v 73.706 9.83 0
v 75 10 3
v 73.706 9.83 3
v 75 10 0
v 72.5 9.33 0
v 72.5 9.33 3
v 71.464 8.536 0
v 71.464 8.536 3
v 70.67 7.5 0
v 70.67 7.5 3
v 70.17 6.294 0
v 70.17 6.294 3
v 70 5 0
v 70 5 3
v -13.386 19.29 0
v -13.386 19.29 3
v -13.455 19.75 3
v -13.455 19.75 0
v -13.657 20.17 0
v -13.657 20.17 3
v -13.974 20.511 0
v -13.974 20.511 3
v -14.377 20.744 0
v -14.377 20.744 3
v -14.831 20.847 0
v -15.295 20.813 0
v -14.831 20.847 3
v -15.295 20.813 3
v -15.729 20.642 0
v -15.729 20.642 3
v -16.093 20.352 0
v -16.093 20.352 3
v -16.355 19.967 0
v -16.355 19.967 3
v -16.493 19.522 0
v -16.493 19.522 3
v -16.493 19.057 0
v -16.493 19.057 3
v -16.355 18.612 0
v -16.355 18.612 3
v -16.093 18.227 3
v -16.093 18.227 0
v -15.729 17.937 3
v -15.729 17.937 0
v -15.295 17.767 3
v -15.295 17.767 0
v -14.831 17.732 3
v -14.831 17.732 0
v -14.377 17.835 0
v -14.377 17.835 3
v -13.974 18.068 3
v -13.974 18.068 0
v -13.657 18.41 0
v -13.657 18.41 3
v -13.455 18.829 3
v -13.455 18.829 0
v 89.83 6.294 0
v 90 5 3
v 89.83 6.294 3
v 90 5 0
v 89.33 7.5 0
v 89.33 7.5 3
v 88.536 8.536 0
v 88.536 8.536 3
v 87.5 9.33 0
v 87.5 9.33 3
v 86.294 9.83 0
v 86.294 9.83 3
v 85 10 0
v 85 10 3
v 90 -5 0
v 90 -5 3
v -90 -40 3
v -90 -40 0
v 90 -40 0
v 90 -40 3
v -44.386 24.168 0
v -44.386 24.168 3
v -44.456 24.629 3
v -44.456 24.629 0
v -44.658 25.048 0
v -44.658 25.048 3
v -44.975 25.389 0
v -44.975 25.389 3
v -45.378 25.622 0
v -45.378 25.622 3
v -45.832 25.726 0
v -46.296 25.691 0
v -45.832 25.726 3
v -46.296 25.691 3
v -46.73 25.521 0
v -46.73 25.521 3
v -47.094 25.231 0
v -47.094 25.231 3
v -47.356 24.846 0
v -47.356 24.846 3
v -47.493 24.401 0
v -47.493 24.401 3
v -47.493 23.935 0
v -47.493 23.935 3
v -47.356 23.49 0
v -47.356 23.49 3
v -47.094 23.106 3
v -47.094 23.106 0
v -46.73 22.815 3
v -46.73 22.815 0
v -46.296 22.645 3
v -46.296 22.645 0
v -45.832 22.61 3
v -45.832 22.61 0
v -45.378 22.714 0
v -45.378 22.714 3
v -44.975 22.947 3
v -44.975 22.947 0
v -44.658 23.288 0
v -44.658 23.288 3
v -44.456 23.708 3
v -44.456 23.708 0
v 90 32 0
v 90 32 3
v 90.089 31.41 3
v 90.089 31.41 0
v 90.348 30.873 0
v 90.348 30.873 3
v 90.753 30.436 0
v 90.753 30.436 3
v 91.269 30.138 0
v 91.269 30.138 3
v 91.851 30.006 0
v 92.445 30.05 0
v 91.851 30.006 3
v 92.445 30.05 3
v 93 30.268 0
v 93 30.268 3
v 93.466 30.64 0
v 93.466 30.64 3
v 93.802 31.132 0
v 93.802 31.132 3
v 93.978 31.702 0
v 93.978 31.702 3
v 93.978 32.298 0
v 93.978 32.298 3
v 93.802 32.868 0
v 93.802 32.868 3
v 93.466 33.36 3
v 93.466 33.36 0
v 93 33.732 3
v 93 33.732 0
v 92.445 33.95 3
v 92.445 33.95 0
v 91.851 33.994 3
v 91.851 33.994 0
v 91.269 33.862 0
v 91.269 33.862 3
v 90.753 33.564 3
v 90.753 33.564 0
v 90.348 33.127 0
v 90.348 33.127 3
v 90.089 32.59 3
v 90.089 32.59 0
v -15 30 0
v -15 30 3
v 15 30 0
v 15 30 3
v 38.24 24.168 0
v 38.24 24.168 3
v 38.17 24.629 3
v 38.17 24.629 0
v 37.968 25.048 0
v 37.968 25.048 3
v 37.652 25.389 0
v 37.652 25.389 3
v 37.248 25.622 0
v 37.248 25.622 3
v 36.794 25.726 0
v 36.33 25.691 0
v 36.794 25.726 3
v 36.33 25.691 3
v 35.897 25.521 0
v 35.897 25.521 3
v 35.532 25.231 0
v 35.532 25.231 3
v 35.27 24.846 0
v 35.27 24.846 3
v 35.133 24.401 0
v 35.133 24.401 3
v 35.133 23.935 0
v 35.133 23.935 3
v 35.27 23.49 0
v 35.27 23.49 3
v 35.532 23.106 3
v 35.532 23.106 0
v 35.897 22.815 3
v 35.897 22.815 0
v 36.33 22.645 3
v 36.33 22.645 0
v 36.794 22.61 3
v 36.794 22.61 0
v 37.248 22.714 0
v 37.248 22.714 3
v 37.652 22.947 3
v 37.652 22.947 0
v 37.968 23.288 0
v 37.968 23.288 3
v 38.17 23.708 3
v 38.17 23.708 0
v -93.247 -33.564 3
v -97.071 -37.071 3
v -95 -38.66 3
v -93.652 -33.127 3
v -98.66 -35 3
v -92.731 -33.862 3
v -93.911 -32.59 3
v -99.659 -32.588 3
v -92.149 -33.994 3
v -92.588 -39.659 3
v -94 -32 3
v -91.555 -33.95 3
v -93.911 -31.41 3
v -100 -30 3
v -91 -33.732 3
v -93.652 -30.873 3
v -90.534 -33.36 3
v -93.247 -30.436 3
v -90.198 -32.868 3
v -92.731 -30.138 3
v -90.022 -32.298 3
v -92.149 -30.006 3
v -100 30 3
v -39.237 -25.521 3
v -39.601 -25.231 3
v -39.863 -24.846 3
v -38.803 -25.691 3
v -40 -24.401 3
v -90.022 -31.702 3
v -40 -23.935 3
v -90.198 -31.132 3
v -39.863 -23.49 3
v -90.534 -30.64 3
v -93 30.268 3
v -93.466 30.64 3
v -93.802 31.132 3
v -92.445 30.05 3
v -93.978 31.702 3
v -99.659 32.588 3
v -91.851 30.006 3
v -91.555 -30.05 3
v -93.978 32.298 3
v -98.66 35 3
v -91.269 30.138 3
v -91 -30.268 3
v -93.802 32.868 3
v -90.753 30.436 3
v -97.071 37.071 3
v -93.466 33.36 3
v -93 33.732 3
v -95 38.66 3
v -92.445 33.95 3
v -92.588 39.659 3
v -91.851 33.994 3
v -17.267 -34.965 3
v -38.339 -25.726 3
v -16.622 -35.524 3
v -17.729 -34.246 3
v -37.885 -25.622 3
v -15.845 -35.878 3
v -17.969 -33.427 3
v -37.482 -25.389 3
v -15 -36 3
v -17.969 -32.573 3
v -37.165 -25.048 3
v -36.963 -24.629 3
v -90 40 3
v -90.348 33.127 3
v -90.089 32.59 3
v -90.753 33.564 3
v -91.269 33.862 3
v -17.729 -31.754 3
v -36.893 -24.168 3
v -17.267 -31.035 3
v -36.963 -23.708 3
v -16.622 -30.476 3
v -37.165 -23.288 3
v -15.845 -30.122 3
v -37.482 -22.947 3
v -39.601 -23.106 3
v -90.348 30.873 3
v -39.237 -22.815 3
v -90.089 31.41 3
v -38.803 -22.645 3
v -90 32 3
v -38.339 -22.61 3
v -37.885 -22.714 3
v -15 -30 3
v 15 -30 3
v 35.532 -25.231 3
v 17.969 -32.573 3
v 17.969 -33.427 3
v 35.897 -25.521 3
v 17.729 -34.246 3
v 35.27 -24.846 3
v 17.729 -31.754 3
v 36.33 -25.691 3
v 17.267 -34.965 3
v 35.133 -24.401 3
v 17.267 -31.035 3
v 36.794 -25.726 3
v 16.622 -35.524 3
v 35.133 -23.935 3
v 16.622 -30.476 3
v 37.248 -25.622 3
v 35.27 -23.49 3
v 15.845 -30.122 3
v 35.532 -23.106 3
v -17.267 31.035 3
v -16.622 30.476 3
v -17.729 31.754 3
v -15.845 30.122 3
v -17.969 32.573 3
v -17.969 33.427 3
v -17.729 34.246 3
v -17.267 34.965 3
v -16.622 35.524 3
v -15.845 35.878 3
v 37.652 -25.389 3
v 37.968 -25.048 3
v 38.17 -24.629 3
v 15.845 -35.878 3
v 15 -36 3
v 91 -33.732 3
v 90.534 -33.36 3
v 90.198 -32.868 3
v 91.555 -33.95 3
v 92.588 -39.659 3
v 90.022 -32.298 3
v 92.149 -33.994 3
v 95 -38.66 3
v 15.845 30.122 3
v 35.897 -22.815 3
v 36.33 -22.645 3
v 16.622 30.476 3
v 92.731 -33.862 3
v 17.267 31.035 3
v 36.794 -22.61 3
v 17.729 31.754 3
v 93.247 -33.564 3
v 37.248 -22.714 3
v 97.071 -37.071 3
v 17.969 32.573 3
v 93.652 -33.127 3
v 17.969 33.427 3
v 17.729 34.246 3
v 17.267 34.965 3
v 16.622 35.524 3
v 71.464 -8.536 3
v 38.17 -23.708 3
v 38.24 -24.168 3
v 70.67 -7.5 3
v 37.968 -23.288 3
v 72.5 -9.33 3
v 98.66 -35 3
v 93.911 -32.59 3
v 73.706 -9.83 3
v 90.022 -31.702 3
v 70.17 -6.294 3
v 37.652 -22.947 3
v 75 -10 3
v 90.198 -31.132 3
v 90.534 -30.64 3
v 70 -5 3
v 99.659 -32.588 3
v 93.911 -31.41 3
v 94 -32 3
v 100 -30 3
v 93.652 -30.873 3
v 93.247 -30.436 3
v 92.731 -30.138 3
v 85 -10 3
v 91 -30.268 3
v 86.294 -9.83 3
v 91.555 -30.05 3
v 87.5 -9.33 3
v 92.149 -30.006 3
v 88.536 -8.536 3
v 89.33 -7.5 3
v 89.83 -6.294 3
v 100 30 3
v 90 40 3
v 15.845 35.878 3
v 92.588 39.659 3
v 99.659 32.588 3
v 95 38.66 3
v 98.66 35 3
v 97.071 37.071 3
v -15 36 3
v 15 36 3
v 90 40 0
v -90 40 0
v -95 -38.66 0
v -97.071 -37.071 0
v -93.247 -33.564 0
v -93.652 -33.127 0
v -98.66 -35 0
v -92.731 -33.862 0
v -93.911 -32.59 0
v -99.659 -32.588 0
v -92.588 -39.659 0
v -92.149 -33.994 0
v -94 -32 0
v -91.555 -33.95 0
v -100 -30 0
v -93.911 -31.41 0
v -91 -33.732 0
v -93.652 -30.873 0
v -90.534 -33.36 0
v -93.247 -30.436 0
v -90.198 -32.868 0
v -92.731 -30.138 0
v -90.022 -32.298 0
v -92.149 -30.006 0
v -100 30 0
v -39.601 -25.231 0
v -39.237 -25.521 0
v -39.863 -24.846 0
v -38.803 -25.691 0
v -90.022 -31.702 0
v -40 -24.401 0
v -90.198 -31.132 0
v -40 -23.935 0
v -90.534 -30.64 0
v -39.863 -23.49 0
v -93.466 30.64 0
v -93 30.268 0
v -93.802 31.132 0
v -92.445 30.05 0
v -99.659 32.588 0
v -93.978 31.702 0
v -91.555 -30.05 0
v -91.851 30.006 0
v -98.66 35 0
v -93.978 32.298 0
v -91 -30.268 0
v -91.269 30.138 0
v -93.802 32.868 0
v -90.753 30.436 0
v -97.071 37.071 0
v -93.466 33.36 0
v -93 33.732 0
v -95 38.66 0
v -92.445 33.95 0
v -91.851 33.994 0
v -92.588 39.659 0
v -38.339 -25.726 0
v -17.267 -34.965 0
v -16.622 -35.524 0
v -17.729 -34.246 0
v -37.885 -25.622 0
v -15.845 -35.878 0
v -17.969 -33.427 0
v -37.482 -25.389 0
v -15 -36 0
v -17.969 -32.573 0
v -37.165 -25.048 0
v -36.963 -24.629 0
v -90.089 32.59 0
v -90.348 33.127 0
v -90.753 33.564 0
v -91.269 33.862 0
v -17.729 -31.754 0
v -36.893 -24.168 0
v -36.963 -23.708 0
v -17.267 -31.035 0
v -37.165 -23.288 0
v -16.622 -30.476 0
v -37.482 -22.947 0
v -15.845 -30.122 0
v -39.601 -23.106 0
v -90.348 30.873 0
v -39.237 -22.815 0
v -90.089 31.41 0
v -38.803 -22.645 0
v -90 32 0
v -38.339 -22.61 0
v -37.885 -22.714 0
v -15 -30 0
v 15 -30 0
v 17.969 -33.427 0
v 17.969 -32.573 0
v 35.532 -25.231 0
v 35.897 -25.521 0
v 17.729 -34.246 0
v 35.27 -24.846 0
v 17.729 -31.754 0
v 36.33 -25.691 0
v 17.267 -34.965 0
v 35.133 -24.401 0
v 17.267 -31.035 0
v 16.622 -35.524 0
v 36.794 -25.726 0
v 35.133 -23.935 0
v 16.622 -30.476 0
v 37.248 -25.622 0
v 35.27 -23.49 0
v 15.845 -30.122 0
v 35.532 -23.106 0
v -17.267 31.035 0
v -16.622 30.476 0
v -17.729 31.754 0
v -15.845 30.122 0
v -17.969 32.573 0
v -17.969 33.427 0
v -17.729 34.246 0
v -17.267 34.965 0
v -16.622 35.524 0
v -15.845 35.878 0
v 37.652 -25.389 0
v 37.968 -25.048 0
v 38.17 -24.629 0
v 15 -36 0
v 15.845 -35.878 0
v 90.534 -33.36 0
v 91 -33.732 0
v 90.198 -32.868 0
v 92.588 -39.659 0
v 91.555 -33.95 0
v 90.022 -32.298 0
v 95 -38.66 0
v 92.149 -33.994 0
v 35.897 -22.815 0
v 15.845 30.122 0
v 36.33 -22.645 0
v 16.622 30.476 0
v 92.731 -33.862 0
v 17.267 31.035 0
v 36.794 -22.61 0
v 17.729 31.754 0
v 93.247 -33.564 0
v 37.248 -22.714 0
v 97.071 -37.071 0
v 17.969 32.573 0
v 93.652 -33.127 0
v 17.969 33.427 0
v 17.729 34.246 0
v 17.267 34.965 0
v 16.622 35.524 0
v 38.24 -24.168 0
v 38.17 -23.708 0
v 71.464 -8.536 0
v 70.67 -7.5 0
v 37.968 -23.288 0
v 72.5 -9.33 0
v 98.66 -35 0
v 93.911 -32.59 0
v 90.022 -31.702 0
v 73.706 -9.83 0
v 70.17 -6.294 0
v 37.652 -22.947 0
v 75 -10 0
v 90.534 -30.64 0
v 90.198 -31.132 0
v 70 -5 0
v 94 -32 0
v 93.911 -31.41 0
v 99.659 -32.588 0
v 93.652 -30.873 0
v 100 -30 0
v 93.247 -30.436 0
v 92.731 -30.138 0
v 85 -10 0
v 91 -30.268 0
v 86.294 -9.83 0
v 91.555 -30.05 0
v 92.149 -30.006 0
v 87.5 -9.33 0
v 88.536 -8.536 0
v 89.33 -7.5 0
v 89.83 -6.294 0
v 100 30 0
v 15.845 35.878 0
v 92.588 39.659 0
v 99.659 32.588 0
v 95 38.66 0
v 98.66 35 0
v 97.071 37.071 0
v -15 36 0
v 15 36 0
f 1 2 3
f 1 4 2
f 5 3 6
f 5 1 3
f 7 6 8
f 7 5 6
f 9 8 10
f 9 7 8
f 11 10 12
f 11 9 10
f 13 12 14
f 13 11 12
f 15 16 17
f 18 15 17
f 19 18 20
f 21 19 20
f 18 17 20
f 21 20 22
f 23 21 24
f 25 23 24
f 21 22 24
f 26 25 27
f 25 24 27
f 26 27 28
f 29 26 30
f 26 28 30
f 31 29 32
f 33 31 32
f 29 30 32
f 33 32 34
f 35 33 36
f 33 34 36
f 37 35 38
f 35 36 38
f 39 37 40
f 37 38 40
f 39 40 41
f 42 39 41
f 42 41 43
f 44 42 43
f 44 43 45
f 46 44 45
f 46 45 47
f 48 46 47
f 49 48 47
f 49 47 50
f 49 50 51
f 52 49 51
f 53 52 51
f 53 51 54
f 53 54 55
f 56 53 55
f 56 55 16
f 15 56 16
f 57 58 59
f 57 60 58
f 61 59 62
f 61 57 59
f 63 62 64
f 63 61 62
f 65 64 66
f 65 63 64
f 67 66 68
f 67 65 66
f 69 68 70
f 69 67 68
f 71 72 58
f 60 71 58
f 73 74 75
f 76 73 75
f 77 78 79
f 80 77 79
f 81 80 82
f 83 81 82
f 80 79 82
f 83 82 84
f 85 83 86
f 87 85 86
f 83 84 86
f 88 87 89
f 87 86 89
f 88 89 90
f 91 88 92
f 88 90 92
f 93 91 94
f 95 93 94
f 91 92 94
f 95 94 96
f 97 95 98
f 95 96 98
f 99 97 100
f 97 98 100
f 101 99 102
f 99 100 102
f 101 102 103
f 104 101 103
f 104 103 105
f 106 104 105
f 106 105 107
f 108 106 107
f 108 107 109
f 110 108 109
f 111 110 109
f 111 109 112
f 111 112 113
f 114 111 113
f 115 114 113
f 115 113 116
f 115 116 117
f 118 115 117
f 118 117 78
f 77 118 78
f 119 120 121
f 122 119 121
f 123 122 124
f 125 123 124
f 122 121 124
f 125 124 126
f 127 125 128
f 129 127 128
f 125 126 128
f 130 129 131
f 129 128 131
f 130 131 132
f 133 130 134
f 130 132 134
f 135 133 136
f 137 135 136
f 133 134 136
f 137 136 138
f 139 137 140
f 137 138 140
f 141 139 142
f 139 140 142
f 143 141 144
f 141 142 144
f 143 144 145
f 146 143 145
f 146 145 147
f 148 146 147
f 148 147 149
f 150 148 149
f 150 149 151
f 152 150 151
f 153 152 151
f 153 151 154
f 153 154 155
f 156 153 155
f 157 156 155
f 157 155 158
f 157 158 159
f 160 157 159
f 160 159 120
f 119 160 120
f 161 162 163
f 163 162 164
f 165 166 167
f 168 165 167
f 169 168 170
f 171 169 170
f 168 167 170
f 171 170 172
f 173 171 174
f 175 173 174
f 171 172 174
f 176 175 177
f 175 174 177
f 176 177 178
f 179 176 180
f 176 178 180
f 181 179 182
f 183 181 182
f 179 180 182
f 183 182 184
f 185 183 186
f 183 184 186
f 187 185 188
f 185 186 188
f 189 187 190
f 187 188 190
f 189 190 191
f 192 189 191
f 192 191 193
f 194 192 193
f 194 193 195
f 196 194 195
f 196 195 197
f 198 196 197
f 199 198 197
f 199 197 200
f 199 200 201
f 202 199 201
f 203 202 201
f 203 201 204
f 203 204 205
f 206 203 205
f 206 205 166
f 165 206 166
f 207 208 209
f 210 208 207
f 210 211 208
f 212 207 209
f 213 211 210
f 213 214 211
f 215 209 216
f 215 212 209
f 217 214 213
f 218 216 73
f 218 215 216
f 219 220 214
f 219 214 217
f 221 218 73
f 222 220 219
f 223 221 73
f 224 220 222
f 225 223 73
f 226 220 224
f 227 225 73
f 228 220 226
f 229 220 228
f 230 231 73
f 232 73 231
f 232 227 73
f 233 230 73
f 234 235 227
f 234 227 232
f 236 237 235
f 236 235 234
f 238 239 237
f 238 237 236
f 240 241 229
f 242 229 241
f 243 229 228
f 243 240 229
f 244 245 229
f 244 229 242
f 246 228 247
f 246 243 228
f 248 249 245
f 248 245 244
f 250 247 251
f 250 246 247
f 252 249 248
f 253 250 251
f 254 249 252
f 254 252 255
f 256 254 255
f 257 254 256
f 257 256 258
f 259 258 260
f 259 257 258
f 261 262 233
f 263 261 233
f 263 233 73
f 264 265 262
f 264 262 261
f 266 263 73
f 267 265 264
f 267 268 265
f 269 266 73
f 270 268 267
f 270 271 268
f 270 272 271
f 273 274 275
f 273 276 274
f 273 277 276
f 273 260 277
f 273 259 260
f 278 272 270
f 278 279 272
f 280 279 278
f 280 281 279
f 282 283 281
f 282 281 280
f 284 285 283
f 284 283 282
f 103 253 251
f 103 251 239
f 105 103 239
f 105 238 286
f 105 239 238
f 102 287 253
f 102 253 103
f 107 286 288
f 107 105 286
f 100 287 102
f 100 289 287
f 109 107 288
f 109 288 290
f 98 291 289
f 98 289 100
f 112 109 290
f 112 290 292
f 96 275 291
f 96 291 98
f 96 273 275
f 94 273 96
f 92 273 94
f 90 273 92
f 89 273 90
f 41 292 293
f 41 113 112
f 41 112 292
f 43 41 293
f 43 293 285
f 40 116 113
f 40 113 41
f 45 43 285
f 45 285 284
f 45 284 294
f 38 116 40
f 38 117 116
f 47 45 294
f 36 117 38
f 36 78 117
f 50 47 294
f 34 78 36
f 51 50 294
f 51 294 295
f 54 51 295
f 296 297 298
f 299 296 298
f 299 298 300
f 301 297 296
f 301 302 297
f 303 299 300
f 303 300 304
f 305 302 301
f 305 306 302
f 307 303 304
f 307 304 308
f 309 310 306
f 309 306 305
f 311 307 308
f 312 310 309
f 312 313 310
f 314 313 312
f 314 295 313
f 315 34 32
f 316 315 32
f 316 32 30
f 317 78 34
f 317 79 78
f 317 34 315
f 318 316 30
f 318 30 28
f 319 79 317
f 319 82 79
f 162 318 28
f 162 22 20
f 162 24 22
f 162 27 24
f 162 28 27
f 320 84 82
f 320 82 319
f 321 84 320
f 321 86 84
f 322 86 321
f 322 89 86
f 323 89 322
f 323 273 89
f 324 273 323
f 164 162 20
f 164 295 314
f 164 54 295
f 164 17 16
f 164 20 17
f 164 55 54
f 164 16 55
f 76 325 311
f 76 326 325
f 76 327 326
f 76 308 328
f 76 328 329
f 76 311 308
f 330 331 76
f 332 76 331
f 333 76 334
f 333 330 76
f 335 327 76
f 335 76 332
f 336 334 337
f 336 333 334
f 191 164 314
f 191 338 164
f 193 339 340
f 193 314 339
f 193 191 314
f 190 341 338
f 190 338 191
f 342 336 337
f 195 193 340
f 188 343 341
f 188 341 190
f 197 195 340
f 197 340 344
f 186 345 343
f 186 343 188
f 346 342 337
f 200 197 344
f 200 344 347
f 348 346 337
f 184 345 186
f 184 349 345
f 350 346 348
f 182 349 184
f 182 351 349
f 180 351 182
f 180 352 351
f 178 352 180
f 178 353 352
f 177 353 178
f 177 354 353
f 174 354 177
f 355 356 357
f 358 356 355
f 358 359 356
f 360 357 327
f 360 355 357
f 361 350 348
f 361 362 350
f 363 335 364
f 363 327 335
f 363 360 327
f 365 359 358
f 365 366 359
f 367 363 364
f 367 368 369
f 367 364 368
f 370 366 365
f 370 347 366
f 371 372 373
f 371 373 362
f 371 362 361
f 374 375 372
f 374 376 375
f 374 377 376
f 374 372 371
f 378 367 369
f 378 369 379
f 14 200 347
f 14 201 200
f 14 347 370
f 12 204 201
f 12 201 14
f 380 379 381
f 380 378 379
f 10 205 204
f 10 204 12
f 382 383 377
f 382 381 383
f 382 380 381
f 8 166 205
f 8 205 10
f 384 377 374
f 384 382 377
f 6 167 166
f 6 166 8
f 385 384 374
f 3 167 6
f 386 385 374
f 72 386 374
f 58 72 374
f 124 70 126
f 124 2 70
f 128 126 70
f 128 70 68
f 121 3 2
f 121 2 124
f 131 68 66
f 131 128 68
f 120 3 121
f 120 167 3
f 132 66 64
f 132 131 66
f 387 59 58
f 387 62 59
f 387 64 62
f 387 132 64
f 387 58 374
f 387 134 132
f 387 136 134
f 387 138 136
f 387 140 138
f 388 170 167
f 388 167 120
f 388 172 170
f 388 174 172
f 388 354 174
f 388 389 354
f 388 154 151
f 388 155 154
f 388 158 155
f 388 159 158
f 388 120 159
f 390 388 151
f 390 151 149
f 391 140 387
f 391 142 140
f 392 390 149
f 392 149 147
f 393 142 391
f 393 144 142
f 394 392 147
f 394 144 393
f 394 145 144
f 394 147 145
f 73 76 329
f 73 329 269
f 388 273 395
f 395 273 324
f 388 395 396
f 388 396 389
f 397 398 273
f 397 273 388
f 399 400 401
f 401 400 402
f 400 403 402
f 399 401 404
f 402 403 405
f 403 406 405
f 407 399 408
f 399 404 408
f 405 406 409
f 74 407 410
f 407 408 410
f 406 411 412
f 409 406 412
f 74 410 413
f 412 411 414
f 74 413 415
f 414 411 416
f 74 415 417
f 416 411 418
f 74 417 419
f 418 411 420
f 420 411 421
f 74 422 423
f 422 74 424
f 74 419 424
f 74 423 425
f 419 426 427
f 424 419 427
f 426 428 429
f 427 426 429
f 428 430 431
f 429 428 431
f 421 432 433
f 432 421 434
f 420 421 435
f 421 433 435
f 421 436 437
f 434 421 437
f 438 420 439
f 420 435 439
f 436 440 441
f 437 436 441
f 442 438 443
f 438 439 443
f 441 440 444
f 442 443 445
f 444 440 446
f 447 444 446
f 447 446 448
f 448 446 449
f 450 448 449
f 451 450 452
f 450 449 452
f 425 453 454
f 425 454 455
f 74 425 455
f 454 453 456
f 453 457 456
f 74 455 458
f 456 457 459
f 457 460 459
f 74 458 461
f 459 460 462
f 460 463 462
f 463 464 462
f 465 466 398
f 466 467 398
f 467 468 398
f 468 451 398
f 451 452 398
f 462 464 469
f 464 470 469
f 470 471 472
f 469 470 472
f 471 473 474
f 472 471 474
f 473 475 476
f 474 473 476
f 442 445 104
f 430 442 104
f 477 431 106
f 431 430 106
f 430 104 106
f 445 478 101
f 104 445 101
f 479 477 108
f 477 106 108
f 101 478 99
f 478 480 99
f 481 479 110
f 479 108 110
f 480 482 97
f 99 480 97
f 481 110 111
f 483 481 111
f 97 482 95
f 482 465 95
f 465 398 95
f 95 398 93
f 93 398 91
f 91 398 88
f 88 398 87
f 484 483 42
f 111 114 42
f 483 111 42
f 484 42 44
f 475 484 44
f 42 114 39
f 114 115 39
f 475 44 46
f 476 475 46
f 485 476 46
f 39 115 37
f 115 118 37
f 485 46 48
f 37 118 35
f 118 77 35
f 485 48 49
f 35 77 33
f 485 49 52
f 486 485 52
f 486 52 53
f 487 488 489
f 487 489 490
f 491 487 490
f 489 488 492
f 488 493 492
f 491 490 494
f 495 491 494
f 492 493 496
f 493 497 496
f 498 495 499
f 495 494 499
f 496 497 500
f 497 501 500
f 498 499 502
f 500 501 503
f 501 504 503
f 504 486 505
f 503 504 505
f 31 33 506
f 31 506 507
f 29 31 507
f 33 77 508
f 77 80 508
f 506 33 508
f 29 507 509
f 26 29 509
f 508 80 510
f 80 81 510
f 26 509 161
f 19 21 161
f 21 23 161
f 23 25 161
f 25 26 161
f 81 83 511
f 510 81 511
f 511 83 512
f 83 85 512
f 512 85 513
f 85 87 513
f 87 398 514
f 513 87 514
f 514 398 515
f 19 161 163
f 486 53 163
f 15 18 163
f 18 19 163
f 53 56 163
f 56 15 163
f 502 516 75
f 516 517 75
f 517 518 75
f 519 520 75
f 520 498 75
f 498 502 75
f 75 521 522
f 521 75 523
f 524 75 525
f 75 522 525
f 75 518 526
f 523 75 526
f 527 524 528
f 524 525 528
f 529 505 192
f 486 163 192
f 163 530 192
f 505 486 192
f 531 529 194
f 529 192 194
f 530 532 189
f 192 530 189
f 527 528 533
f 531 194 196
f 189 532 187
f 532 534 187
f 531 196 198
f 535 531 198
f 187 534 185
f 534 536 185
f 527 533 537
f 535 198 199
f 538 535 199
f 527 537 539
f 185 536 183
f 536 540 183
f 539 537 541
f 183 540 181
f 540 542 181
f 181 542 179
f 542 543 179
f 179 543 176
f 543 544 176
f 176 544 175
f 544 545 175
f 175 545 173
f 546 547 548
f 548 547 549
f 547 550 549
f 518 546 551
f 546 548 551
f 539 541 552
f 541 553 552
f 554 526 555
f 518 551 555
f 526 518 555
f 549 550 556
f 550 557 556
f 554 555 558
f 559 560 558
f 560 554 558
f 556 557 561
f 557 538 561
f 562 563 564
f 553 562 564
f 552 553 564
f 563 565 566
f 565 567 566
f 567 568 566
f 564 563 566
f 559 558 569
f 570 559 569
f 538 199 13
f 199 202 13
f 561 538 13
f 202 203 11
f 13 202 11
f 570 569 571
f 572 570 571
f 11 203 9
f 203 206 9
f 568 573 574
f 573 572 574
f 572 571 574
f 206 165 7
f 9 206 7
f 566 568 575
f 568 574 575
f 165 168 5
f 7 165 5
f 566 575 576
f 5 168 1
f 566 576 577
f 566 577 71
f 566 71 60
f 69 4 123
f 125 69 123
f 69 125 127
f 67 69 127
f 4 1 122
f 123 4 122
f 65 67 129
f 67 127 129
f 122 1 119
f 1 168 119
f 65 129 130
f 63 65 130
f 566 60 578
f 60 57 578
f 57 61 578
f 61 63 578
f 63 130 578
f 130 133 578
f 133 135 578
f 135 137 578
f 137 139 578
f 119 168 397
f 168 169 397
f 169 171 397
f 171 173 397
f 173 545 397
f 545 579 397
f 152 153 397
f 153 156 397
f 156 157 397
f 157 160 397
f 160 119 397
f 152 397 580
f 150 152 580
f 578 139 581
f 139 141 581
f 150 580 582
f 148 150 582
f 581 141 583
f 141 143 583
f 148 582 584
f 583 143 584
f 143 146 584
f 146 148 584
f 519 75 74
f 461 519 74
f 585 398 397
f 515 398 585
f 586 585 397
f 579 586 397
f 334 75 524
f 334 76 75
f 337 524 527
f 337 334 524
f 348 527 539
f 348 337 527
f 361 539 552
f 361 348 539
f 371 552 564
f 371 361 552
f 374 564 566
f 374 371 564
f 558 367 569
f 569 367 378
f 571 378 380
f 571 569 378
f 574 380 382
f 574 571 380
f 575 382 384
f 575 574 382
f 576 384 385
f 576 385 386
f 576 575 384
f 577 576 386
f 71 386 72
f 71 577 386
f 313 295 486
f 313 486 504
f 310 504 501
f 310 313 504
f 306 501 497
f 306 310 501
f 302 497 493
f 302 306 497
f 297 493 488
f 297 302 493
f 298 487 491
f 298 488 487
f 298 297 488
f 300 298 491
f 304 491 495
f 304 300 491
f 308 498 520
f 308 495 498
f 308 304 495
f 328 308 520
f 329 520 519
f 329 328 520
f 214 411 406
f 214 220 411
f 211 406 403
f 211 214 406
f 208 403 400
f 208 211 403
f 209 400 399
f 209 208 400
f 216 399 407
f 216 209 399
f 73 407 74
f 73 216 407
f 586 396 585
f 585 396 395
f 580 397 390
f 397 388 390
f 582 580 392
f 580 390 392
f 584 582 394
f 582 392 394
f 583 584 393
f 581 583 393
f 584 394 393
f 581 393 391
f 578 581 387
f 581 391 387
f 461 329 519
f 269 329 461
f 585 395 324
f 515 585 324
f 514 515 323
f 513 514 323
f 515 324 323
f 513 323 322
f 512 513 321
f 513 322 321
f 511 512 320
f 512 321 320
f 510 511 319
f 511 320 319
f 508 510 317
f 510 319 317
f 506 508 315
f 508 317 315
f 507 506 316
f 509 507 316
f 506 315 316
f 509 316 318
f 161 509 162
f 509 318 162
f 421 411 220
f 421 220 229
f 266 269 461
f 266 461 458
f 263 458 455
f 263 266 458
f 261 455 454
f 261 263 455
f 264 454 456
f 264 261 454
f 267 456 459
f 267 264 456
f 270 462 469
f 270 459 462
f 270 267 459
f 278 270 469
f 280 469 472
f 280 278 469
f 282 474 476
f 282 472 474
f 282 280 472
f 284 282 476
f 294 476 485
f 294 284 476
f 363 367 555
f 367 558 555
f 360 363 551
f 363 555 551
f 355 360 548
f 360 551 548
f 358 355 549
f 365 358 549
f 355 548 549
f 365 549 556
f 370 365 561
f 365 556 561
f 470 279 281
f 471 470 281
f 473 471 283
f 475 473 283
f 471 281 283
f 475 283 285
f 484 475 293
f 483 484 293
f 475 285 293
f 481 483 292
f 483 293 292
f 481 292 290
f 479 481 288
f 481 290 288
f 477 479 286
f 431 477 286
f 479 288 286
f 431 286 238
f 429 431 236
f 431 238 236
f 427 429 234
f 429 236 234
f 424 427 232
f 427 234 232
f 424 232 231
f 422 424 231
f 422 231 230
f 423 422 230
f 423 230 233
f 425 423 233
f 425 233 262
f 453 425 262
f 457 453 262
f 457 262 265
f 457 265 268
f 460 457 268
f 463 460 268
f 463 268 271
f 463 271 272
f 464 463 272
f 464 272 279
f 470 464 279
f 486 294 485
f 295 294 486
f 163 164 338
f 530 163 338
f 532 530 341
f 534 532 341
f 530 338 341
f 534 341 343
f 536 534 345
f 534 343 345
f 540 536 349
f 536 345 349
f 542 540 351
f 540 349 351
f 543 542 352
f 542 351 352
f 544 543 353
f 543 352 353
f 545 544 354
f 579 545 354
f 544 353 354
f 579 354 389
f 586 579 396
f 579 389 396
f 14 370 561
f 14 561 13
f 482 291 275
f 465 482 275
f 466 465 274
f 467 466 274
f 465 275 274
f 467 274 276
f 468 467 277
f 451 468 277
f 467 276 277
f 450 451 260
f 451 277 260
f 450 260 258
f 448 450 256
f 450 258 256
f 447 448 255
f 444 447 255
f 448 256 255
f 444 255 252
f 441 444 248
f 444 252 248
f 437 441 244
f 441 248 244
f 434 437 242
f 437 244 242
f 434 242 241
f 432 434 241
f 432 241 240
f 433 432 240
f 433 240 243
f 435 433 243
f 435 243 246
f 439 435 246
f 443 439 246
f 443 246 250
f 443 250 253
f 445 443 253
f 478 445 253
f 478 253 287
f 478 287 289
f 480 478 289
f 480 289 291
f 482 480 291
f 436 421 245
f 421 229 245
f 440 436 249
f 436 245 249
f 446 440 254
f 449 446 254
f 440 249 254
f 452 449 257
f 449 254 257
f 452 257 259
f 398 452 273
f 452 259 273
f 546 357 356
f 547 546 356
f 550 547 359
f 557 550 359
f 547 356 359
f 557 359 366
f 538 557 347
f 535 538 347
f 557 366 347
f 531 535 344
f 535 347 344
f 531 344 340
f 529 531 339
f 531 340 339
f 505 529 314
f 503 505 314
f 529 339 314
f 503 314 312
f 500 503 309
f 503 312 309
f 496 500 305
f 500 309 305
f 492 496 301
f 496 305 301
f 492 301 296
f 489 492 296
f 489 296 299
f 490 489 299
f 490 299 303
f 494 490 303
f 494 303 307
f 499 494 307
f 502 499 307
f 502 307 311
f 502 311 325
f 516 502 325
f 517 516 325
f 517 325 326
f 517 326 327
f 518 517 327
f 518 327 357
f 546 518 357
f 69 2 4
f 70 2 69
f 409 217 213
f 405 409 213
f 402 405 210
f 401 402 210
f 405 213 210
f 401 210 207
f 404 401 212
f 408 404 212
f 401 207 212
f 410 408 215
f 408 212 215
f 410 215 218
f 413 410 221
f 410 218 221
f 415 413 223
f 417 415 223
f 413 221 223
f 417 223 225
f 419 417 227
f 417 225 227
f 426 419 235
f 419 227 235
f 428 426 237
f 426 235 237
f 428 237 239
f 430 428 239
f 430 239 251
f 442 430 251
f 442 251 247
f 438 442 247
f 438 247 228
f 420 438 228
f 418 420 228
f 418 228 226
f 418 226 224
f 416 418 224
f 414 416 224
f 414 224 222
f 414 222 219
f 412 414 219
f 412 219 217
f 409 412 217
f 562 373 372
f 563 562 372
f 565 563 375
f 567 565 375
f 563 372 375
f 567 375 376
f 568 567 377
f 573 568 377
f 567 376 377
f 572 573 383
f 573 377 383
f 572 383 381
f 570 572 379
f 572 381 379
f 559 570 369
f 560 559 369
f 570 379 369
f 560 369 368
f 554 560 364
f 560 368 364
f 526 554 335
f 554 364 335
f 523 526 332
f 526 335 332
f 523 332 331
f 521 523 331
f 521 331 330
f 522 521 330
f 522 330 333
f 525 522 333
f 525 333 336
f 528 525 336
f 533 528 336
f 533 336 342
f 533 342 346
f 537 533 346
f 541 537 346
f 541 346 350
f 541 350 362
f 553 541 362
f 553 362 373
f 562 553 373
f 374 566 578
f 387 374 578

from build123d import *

# Parameters (mm, degrees)
SKETCH1_W           = 200
SKETCH1_H           = 80
BOSS_EXTRUDE1_DEPTH = 3
SKETCH2_R           = 2
CUT_EXTRUDE1_DEPTH  = 108.745069493
FILLET1_R           = 10
SKETCH3_R           = 1.5621
CUT_EXTRUDE2_DEPTH  = 108.745069493
SKETCH4_W           = 20
SKETCH4_H           = 20
CUT_EXTRUDE3_DEPTH  = 108.745069493
FILLET2_R           = 5
CUT_EXTRUDE4_DEPTH  = 108.745069493


with BuildPart() as part:
    # Sketch1 → Boss-Extrude1 (new body)
    with BuildSketch(Plane.XY):
        Rectangle(SKETCH1_W, SKETCH1_H)
    extrude(amount=BOSS_EXTRUDE1_DEPTH)

    # Sketch2 → Cut-Extrude1 (cut, through all)
    with BuildSketch(Plane.XY.offset(3)):
        with Locations((-92, 32)):
            Circle(SKETCH2_R)
        with Locations(Location((-92, -32, 0), (0, 0, 180))):
            Circle(SKETCH2_R)
        with Locations((92, -32)):
            Circle(SKETCH2_R)
        with Locations(Location((92, 32, 0), (0, 0, 180))):
            Circle(SKETCH2_R)
    extrude(amount=-CUT_EXTRUDE1_DEPTH, mode=Mode.SUBTRACT)

    # Fillet1
    fillet1_edges = [part.edges().sort_by_distance(p)[0] for p in [
        (100, -40, 1.5),
        (-100, -40, 1.5),
        (-100, 40, 1.5),
        (100, 40, 1.5),
    ]]
    fillet(fillet1_edges, radius=FILLET1_R)

    # Sketch3 → Cut-Extrude2 (cut, through all)
    with BuildSketch(Plane.XY.offset(3)):
        with Locations((36.6776, 24.1681)):
            Circle(SKETCH3_R)
        with Locations((36.6776, -24.1681)):
            Circle(SKETCH3_R)
        with Locations((-38.4556, -24.1681)):
            Circle(SKETCH3_R)
        with Locations((-45.9486, 24.1681)):
            Circle(SKETCH3_R)
        with Locations((-14.9479, 19.289607234)):
            Circle(SKETCH3_R)
    extrude(amount=-CUT_EXTRUDE2_DEPTH, mode=Mode.SUBTRACT)

    # Sketch4 → Cut-Extrude3 (cut, through all)
    with BuildSketch(Plane.XY.offset(3)):
        with Locations((80, 0)):
            Rectangle(SKETCH4_W, SKETCH4_H)
    extrude(amount=-CUT_EXTRUDE3_DEPTH, mode=Mode.SUBTRACT)

    # Fillet2
    fillet2_edges = [part.edges().sort_by_distance(p)[0] for p in [
        (90, 10, 1.5),
        (90, -10, 1.5),
        (70, -10, 1.5),
        (70, 10, 1.5),
    ]]
    fillet(fillet2_edges, radius=FILLET2_R)

    # Sketch5 → Cut-Extrude4 (cut, through all)
    with BuildSketch(Plane.XY.offset(3)):
        with BuildLine():
            Line((-15, -30), (15, -30))
            ThreePointArc((15, -30), (18, -33), (15, -36))
            Line((15, -36), (-15, -36))
            ThreePointArc((-15, -36), (-18, -33), (-15, -30))
        make_face()
        with BuildLine():
            Line((-15, 30), (15, 30))
            ThreePointArc((15, 30), (18, 33), (15, 36))
            Line((15, 36), (-15, 36))
            ThreePointArc((-15, 36), (-18, 33), (-15, 30))
        make_face()
    extrude(amount=-CUT_EXTRUDE4_DEPTH, mode=Mode.SUBTRACT)


solid = part.part
